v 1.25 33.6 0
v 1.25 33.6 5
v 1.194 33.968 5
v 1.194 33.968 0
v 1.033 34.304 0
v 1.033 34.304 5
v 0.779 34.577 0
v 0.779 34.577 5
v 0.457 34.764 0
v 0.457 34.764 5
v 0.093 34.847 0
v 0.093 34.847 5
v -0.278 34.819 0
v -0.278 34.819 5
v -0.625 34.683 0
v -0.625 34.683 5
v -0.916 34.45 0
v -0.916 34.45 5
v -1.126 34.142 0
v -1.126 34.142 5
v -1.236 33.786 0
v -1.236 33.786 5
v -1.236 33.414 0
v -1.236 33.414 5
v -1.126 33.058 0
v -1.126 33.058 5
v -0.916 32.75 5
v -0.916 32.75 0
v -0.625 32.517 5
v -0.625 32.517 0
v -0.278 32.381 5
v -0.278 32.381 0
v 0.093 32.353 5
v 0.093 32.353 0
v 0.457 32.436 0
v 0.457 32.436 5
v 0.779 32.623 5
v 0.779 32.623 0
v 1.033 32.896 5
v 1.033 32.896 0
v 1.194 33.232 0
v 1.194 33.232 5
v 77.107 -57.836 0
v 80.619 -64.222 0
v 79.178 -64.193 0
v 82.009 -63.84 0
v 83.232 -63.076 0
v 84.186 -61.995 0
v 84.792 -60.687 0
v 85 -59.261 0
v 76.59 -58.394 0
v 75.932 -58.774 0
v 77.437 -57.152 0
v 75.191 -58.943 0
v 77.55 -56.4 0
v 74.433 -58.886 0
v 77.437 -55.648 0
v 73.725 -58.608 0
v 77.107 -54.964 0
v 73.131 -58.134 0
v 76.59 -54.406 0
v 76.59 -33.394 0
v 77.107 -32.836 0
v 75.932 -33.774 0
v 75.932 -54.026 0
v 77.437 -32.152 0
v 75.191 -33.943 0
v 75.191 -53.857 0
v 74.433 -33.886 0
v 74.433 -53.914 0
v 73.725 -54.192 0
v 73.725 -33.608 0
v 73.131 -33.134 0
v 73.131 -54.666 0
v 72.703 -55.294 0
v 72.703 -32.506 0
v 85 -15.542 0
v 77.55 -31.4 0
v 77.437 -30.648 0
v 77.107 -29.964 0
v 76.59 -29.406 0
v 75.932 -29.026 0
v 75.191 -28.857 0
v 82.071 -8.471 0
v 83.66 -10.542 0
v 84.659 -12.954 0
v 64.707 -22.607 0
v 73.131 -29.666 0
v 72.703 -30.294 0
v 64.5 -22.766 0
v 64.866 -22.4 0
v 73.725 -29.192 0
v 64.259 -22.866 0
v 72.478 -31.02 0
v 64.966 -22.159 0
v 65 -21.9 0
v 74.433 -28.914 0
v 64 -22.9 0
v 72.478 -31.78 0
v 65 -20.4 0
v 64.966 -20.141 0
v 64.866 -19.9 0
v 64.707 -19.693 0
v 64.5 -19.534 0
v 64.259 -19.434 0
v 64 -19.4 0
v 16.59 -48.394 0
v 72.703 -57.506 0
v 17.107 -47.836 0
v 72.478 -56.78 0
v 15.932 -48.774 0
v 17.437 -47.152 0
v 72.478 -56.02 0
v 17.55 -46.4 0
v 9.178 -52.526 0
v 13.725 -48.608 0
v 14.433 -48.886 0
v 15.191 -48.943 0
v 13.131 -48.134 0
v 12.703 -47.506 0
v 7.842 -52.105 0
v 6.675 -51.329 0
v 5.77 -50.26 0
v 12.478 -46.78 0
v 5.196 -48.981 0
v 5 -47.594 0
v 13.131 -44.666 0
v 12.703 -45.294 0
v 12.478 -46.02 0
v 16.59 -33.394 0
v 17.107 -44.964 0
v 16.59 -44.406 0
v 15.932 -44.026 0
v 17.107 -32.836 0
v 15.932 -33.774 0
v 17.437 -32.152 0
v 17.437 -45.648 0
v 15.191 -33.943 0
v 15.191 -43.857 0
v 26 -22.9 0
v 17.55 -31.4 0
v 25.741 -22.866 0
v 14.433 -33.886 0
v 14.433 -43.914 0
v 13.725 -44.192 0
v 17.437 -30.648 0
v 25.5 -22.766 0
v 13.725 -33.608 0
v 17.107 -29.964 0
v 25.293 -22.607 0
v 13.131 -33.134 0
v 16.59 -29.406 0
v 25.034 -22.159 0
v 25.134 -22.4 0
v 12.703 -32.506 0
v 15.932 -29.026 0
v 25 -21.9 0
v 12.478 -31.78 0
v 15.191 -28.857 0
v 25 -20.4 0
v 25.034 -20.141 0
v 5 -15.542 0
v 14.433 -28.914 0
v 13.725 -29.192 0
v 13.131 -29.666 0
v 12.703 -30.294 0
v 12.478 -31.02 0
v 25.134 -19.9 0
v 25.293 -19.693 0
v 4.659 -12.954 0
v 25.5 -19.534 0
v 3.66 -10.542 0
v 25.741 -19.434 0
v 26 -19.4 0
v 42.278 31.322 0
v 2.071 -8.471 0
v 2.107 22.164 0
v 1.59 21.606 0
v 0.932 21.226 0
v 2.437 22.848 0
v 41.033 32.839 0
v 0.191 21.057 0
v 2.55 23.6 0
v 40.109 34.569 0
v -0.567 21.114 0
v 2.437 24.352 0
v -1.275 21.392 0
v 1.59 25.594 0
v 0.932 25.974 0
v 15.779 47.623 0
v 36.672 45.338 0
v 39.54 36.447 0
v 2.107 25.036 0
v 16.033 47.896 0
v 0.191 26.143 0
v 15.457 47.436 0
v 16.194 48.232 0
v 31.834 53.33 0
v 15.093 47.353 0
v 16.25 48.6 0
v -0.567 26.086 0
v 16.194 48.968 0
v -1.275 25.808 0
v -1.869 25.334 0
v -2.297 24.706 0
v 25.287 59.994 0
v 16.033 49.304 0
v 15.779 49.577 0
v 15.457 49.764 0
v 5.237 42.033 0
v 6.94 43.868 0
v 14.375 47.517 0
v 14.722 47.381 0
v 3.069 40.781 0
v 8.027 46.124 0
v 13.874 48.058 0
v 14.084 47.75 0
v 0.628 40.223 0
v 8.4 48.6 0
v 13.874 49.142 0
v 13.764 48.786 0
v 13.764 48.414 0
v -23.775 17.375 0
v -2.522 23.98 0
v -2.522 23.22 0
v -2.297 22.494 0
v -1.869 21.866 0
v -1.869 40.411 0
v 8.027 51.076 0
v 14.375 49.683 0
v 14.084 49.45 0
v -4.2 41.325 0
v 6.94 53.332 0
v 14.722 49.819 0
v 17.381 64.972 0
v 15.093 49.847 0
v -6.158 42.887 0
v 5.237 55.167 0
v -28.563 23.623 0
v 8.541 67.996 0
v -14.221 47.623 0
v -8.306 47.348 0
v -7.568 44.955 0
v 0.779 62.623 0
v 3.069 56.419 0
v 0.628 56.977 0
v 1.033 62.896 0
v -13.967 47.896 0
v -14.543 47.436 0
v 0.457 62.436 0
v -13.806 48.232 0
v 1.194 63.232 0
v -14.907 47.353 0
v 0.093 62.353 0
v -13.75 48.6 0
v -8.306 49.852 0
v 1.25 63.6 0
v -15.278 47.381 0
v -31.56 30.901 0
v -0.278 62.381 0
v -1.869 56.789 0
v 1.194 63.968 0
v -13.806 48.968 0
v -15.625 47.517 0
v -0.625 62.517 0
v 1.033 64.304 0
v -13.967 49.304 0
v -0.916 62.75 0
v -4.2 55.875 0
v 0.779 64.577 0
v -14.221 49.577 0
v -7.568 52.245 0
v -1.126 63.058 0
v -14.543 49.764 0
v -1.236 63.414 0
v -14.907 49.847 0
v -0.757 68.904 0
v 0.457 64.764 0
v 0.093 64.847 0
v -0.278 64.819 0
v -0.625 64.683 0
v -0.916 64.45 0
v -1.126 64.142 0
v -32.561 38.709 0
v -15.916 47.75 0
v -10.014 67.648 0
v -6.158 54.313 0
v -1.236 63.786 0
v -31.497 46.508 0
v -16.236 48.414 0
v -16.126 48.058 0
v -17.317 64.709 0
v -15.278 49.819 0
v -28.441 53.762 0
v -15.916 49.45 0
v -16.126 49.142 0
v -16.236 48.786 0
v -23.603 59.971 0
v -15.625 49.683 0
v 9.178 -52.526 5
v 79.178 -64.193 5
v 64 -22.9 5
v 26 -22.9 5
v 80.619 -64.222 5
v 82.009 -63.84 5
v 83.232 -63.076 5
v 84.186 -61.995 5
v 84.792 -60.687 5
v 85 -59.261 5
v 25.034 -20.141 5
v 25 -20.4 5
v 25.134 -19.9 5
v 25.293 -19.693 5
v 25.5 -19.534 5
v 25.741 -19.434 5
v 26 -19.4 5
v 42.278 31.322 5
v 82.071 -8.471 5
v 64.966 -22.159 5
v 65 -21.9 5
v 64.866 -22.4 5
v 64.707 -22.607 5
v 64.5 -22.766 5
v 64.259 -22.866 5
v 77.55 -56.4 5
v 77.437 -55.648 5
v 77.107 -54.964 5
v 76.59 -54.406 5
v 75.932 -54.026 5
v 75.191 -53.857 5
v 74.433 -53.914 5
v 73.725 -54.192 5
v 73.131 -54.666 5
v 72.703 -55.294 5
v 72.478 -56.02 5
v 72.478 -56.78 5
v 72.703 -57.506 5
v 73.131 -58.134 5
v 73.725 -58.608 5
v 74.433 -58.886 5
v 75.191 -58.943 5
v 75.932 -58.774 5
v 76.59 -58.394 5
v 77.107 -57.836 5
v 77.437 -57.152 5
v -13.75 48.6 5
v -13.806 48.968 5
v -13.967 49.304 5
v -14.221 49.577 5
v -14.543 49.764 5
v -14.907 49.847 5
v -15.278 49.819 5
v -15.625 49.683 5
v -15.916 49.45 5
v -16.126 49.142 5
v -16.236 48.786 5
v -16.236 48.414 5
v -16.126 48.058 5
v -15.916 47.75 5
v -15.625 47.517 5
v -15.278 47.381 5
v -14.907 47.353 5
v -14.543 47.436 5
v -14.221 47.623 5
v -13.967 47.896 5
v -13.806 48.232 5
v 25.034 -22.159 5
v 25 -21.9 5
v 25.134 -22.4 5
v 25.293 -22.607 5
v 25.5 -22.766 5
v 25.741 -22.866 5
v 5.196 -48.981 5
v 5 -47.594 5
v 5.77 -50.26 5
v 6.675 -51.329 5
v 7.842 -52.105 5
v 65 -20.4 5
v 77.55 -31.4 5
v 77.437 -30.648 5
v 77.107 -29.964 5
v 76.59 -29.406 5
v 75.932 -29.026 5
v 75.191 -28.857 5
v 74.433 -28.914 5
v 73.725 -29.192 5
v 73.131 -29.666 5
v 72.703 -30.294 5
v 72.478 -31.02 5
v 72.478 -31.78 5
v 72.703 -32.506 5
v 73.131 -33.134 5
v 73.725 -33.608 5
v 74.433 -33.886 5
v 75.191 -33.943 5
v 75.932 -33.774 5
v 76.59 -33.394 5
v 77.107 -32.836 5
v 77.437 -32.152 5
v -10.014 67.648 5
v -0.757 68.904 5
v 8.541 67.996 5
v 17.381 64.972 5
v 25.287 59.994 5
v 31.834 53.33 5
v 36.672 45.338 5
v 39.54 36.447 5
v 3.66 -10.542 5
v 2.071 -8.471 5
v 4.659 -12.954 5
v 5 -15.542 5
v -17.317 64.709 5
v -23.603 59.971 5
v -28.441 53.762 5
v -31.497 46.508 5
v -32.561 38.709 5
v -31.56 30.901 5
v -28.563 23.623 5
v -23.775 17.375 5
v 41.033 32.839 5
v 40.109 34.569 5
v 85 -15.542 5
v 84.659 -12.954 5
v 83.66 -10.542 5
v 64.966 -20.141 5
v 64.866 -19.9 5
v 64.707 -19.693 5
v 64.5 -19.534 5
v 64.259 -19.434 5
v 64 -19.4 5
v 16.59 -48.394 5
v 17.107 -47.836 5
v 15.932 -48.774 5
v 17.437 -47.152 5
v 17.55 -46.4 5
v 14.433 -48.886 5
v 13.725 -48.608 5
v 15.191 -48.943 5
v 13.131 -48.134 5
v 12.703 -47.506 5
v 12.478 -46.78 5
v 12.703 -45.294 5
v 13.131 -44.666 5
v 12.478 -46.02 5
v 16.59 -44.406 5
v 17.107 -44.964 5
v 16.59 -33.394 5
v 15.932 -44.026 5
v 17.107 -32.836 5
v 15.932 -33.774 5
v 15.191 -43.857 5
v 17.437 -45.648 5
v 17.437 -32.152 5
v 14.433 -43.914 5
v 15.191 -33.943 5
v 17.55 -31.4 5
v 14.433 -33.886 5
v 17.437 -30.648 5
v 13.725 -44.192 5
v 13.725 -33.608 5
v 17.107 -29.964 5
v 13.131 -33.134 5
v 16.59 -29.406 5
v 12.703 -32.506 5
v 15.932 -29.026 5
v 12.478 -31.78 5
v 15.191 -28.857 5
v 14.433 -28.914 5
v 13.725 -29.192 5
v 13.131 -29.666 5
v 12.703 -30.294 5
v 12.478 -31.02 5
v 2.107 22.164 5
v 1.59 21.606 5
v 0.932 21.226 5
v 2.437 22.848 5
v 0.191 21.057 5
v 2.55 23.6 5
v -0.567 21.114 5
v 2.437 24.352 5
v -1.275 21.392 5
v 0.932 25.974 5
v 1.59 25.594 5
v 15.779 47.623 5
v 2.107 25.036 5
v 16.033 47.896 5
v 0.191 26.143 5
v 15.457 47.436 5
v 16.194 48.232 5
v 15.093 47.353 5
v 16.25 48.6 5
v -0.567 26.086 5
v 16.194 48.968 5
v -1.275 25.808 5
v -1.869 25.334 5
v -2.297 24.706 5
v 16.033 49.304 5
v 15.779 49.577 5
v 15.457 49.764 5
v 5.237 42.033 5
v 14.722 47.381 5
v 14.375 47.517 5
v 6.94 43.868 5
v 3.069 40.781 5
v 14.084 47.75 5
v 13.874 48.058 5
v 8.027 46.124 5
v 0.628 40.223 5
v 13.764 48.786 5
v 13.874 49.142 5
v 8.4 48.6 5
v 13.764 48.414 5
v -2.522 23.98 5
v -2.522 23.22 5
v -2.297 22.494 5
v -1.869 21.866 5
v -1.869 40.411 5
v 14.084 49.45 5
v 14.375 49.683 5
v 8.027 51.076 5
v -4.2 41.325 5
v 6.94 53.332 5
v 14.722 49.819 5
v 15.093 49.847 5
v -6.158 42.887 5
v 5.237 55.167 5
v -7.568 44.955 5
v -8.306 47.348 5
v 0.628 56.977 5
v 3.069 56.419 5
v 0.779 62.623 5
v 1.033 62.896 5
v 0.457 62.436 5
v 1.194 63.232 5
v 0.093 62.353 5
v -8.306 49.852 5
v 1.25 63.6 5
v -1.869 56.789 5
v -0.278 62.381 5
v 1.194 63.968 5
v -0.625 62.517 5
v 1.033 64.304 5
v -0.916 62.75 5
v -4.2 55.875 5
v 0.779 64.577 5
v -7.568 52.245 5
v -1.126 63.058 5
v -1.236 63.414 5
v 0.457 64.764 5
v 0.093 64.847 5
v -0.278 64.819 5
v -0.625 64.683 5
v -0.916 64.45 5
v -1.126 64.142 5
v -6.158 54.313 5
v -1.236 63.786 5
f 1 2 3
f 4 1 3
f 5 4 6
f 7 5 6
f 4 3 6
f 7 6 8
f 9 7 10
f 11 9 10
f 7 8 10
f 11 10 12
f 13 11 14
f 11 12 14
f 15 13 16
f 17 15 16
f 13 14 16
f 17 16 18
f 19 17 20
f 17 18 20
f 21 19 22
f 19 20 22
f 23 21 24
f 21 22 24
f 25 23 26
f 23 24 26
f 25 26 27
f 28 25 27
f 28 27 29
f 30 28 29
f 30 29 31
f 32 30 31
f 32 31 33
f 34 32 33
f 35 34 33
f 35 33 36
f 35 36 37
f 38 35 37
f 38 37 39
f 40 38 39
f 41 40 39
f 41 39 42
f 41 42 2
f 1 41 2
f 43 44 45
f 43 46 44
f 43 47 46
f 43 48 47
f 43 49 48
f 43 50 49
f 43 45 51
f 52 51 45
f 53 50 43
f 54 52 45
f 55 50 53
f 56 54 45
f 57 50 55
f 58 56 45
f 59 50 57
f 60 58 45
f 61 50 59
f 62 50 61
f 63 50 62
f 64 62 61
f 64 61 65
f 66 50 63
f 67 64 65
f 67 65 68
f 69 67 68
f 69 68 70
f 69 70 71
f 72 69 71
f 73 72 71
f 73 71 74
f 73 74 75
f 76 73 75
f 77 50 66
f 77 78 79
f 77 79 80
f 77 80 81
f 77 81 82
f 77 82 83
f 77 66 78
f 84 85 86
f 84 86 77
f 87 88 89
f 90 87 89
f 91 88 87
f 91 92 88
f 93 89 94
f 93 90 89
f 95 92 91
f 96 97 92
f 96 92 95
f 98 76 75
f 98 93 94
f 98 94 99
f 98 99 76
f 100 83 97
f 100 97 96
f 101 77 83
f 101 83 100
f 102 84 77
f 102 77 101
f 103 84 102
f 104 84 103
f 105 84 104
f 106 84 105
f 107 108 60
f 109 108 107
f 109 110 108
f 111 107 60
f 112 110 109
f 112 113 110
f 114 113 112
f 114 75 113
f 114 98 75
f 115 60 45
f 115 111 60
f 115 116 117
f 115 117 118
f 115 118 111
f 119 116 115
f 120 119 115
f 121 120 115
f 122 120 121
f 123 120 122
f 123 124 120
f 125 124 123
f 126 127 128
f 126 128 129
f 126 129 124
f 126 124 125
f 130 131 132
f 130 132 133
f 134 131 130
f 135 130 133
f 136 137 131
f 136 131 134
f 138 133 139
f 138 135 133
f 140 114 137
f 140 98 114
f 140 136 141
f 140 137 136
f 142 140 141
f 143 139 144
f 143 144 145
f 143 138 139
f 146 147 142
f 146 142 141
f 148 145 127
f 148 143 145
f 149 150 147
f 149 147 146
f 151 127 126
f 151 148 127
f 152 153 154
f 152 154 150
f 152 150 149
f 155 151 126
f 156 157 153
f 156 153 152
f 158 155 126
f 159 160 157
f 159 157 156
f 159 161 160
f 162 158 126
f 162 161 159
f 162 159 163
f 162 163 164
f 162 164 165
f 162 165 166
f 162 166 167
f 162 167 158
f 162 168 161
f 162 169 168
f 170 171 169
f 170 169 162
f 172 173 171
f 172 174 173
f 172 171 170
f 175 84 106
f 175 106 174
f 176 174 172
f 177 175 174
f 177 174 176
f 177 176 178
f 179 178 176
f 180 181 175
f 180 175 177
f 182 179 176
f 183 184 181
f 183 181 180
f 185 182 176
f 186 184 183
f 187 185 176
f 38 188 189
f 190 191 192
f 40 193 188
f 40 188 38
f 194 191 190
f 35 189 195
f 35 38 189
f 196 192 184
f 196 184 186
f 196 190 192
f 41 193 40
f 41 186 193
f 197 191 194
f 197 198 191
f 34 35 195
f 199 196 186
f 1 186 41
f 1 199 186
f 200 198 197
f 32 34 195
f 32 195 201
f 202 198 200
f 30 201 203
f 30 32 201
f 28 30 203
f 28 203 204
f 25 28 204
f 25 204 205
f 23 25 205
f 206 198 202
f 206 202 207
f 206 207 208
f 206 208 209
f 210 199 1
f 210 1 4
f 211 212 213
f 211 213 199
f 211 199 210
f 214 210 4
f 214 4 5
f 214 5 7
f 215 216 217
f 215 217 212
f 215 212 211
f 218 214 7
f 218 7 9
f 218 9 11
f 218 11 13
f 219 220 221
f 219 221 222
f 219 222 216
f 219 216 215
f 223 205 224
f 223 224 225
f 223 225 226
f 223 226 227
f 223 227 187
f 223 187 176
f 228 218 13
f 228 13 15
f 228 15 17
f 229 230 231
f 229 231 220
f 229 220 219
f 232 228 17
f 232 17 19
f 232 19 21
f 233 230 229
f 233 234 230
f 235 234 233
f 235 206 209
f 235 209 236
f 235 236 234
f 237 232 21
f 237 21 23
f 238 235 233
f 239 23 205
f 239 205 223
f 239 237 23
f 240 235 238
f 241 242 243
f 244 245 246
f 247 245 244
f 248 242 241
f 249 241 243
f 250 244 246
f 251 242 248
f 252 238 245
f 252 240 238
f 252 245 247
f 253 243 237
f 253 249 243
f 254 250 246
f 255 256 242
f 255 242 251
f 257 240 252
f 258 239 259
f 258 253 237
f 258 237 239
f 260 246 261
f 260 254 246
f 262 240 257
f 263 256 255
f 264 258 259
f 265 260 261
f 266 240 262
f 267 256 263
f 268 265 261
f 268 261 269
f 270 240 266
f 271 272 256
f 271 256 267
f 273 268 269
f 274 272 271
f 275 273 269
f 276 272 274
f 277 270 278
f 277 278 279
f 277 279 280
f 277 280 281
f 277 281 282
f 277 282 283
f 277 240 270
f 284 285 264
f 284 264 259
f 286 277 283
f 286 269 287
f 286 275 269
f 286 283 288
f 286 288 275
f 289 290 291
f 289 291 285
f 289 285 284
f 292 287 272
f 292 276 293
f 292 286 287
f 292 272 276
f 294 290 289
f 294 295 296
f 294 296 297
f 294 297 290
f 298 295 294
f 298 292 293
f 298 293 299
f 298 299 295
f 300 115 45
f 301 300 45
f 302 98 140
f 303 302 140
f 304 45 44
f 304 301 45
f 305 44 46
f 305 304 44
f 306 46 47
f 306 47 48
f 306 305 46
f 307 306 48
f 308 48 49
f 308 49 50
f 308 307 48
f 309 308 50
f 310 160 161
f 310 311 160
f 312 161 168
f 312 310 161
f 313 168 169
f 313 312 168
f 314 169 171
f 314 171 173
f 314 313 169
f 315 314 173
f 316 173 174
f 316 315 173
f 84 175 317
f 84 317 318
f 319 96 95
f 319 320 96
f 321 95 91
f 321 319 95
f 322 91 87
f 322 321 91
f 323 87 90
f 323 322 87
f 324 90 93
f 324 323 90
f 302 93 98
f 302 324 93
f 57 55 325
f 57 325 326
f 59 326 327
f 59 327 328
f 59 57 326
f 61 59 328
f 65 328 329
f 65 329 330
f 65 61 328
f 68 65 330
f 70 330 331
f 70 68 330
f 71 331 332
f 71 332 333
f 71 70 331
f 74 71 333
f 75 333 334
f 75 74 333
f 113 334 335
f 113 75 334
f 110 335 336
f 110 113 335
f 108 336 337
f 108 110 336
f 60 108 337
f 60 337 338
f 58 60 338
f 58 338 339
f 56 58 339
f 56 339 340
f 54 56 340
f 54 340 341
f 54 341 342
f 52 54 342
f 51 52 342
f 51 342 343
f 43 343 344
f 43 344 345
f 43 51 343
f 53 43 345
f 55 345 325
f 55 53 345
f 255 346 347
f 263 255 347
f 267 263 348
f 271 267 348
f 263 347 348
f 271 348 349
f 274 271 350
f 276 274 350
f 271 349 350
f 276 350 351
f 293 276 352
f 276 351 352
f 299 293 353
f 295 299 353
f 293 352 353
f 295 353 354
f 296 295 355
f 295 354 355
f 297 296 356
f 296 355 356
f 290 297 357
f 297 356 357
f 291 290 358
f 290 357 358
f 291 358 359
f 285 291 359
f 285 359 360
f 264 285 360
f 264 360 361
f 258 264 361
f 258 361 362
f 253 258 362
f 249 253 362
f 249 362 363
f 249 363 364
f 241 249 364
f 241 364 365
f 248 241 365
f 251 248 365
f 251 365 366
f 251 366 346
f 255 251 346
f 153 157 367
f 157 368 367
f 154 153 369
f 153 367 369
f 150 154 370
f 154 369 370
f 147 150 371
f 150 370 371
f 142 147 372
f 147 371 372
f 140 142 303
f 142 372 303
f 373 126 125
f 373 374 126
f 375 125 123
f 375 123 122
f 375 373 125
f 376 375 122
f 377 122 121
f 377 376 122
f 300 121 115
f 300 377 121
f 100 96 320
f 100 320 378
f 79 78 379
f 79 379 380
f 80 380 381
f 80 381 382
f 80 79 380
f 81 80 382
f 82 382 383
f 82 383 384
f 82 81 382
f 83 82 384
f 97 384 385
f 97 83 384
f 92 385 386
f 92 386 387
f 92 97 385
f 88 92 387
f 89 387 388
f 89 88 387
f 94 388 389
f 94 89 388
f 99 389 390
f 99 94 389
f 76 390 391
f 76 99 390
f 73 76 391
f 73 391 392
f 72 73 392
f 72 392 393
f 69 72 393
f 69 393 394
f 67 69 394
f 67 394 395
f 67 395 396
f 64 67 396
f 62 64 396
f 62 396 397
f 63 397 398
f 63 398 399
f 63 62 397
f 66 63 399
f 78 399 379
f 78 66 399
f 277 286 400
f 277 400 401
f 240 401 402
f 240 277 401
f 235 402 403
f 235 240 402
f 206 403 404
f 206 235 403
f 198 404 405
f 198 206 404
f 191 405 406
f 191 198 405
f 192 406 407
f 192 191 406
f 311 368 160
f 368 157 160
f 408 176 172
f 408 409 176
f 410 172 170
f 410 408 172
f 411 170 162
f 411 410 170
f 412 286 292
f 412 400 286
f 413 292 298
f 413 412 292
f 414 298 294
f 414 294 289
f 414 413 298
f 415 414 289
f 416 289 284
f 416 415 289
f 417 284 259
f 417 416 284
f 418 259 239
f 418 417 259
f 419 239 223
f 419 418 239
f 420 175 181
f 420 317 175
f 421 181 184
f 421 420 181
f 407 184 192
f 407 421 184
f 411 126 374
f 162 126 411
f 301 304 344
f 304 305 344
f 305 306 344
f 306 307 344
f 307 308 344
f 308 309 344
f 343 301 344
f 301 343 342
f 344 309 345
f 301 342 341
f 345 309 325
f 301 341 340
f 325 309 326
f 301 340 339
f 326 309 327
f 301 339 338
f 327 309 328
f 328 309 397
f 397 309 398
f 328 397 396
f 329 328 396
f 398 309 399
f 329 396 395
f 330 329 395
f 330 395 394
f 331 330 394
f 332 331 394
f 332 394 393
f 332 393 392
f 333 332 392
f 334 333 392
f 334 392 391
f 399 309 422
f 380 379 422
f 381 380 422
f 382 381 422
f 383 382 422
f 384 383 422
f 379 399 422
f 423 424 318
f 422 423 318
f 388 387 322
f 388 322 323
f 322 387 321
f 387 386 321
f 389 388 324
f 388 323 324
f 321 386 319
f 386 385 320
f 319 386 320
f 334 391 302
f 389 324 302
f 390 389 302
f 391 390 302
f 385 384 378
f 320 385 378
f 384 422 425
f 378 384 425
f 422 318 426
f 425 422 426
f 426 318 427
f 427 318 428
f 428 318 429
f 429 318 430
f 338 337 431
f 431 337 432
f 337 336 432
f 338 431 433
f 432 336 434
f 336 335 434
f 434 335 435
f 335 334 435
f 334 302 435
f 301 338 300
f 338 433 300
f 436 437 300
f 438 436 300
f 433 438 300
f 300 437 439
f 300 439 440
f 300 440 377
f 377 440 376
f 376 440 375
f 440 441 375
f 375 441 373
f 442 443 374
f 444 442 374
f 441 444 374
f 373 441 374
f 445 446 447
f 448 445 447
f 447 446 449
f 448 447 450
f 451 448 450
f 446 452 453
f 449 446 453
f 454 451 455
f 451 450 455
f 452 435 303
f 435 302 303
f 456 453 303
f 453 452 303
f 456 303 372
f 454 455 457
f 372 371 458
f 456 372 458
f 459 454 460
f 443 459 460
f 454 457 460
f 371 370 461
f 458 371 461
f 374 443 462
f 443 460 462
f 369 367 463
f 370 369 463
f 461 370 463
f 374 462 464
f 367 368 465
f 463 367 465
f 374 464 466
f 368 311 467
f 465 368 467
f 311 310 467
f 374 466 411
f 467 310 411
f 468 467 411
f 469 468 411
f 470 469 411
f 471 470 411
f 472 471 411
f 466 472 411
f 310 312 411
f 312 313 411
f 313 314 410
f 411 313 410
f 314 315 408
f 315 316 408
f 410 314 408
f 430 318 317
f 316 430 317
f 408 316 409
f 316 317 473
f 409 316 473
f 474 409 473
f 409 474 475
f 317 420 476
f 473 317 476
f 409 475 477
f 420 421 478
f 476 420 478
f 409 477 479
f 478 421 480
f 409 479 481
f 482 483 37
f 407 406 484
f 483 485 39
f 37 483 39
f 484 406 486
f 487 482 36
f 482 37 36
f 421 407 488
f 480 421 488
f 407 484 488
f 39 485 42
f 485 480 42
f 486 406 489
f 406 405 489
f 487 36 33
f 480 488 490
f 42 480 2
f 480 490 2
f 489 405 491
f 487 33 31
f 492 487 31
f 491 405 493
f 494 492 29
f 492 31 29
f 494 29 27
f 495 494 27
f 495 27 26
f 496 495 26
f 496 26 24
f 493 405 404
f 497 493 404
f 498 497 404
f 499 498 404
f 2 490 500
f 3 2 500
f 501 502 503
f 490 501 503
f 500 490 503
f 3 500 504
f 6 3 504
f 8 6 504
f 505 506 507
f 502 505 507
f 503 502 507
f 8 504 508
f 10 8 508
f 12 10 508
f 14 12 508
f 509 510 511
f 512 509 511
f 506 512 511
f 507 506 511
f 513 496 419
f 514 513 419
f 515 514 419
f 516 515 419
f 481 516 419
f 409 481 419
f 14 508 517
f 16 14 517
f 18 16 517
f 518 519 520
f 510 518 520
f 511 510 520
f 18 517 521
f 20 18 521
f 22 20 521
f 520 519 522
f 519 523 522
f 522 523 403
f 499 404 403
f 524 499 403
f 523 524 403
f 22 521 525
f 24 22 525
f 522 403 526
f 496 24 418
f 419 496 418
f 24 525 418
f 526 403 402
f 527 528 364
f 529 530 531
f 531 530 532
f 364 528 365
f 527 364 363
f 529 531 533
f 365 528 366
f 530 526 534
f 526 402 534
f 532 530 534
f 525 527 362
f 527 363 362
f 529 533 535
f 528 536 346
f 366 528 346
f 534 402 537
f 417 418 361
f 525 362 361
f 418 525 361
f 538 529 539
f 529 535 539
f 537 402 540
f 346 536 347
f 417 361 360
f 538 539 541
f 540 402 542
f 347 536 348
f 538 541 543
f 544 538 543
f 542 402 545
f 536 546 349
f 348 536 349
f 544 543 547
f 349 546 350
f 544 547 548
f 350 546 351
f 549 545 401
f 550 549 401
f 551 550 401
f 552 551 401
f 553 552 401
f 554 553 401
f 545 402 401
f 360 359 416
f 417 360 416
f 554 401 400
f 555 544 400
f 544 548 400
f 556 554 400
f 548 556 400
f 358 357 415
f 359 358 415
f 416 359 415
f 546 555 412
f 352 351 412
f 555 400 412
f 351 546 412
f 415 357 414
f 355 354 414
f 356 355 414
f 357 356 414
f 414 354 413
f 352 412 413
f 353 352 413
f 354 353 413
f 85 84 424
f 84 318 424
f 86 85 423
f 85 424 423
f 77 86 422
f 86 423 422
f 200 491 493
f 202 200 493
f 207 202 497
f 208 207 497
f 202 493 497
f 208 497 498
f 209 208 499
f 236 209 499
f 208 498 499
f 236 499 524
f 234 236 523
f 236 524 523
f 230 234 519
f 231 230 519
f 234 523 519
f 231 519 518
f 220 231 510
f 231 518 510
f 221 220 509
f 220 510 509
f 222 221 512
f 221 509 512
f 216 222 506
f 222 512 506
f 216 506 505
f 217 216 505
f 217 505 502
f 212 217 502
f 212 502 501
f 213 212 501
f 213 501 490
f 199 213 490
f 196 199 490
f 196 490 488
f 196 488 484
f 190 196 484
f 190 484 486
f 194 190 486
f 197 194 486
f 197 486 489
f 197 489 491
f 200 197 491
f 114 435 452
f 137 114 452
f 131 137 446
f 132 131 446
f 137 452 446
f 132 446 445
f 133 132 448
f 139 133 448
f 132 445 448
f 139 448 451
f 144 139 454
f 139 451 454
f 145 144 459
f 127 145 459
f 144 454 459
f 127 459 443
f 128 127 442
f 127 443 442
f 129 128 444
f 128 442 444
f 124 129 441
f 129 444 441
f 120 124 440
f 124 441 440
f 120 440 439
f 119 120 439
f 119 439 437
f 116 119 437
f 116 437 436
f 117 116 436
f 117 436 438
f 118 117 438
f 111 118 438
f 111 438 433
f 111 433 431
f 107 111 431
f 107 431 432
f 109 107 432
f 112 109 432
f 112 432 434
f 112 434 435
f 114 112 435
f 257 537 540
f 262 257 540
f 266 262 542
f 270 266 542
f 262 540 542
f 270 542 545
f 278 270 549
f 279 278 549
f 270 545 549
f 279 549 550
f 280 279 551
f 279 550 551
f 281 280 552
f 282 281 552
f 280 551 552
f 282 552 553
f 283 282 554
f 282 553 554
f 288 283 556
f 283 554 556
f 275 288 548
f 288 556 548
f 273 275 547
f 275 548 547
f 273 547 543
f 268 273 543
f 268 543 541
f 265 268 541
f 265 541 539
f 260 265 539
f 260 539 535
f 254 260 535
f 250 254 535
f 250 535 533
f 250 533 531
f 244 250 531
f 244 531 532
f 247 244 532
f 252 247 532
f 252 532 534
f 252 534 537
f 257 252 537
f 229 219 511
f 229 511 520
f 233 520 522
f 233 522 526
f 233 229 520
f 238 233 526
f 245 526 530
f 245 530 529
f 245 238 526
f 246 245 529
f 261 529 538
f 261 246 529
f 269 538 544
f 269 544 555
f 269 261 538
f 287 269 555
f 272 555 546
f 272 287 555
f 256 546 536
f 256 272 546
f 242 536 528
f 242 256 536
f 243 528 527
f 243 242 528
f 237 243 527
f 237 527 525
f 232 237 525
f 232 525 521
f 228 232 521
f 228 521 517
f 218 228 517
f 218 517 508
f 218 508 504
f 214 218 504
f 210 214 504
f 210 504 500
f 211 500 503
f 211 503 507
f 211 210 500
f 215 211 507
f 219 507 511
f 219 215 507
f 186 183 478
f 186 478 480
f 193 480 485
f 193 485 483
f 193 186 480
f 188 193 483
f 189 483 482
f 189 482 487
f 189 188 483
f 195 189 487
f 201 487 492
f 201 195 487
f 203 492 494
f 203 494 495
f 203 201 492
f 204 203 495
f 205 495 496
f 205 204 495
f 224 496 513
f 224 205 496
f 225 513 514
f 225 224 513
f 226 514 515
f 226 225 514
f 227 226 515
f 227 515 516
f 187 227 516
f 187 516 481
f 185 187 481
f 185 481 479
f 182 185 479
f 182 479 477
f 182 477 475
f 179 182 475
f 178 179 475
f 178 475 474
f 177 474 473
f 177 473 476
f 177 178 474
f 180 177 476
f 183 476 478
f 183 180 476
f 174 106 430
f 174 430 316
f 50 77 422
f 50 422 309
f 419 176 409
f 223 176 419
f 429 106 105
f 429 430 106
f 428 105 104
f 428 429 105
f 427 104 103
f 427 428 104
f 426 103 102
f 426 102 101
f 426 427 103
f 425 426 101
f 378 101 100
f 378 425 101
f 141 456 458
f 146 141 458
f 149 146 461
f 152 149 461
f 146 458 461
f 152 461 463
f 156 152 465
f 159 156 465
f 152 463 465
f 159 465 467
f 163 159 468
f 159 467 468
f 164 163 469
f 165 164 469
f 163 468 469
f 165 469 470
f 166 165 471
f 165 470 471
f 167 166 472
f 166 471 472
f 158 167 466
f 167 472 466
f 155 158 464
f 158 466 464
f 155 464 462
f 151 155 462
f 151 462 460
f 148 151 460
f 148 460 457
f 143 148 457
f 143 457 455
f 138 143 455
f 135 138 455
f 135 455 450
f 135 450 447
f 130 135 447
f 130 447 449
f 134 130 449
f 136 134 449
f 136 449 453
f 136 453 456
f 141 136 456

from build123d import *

# Parameters (mm, degrees)
SKETCH_1_R          = 2.55
SKETCH_1_R_2        = 8.4
EXTRUDE_1_DEPTH     = 5
FILLET_1_R          = 10
SKETCH_2_R          = 2.55
CUT_EXTRUDE_1_DEPTH = 112.121375081
FILLET_2_R          = 30
SKETCH_3_W          = 40
SKETCH_3_H          = 3
CUT_EXTRUDE_2_DEPTH = 112.121375081
SKETCH_5_W          = 40
SKETCH_5_H          = 0.5
CUT_EXTRUDE_4_DEPTH = 112.121375081
FILLET_3_R          = 1
CUT_EXTRUDE_5_DEPTH = 112.121375081
FILLET_4_R          = 5
SKETCH_7_R          = 1.25
CUT_EXTRUDE_6_DEPTH = 110.538877646


with BuildPart() as part:
    # ｽｹｯﾁ1 → ﾎﾞｽ - 押し出し1 (new body)
    with BuildSketch(Plane.XY):
        with BuildLine():
            Line((40, 33.6), (85, -11.4))
            Line((85, -11.4), (85, -71.4))
            Line((85, -71.4), (5, -71.4))
            Line((5, -71.4), (5, -11.4))
            Line((5, -11.4), (-40, 33.6))
            ThreePointArc((-40, 33.6), (0, 68.911288741), (40, 33.6))
        make_face()
        with Locations((75, -31.4)):
            Circle(SKETCH_1_R, mode=Mode.SUBTRACT)
        with Locations((75, -56.4)):
            Circle(SKETCH_1_R, mode=Mode.SUBTRACT)
        with Locations((0, 23.6)):
            Circle(SKETCH_1_R, mode=Mode.SUBTRACT)
        with Locations((0, 48.6)):
            Circle(SKETCH_1_R_2, mode=Mode.SUBTRACT)
    extrude(amount=EXTRUDE_1_DEPTH)

    # ﾌｨﾚｯﾄ1
    fillet_1_edges = [part.edges().sort_by_distance(p)[0] for p in [
        (40, 33.6, 2.5),
        (85, -11.4, 2.5),
        (5, -11.4, 2.5),
    ]]
    fillet(fillet_1_edges, radius=FILLET_1_R)

    # ｽｹｯﾁ2 → ｶｯﾄ - 押し出し1 (cut, through all)
    with BuildSketch(Plane.XY.offset(5)):
        with Locations((15, -46.4)):
            Circle(SKETCH_2_R)
        with Locations((15, -31.4)):
            Circle(SKETCH_2_R)
    extrude(amount=-CUT_EXTRUDE_1_DEPTH, mode=Mode.SUBTRACT)

    # ﾌｨﾚｯﾄ2
    fillet_2_edges = [part.edges().sort_by_distance(p)[0] for p in [
        (-40, 33.6, 2.5),
    ]]
    fillet(fillet_2_edges, radius=FILLET_2_R)

    # ｽｹｯﾁ3 → ｶｯﾄ - 押し出し2 (cut, through all)
    with BuildSketch(Plane(origin=(0, 0, 0), x_dir=(-1, 0, 0), z_dir=(0, 0, -1))):
        with Locations((-45, -21.4)):
            Rectangle(SKETCH_3_W, SKETCH_3_H)
    extrude(amount=-CUT_EXTRUDE_2_DEPTH, mode=Mode.SUBTRACT)

    # ｽｹｯﾁ5 → ｶｯﾄ - 押し出し4 (cut, through all)
    with BuildSketch(Plane(origin=(0, 0, 0), x_dir=(-1, 0, 0), z_dir=(0, 0, -1))):
        with Locations((-45, -19.65)):
            Rectangle(SKETCH_5_W, SKETCH_5_H)
    extrude(amount=-CUT_EXTRUDE_4_DEPTH, mode=Mode.SUBTRACT)

    # ﾌｨﾚｯﾄ3
    fillet_3_edges = [part.edges().sort_by_distance(p)[0] for p in [
        (25, -22.9, 2.5),
        (65, -22.9, 2.5),
        (65, -19.4, 2.5),
        (25, -19.4, 2.5),
    ]]
    fillet(fillet_3_edges, radius=FILLET_3_R)

    # ｽｹｯﾁ6 → ｶｯﾄ - 押し出し5 (cut, through all)
    with BuildSketch(Plane(origin=(0, 0, 0), x_dir=(-1, 0, 0), z_dir=(0, 0, -1))):
        Polygon((-5, -51.829889619), (-122.420662288, -71.4), (-5, -71.4), align=None)
    extrude(amount=-CUT_EXTRUDE_5_DEPTH, mode=Mode.SUBTRACT)

    # ﾌｨﾚｯﾄ4
    fillet_4_edges = [part.edges().sort_by_distance(p)[0] for p in [
        (85, -65.163222952, 2.5),
        (5, -51.829889619, 2.5),
    ]]
    fillet(fillet_4_edges, radius=FILLET_4_R)

    # ｽｹｯﾁ7 → ｶｯﾄ - 押し出し6 (cut, through all)
    with BuildSketch(Plane.XY.offset(5)):
        with Locations((0, 63.6)):
            Circle(SKETCH_7_R)
        with Locations((15, 48.6)):
            Circle(SKETCH_7_R)
        with Locations((0, 33.6)):
            Circle(SKETCH_7_R)
        with Locations((-15, 48.6)):
            Circle(SKETCH_7_R)
    extrude(amount=-CUT_EXTRUDE_6_DEPTH, mode=Mode.SUBTRACT)


solid = part.part
